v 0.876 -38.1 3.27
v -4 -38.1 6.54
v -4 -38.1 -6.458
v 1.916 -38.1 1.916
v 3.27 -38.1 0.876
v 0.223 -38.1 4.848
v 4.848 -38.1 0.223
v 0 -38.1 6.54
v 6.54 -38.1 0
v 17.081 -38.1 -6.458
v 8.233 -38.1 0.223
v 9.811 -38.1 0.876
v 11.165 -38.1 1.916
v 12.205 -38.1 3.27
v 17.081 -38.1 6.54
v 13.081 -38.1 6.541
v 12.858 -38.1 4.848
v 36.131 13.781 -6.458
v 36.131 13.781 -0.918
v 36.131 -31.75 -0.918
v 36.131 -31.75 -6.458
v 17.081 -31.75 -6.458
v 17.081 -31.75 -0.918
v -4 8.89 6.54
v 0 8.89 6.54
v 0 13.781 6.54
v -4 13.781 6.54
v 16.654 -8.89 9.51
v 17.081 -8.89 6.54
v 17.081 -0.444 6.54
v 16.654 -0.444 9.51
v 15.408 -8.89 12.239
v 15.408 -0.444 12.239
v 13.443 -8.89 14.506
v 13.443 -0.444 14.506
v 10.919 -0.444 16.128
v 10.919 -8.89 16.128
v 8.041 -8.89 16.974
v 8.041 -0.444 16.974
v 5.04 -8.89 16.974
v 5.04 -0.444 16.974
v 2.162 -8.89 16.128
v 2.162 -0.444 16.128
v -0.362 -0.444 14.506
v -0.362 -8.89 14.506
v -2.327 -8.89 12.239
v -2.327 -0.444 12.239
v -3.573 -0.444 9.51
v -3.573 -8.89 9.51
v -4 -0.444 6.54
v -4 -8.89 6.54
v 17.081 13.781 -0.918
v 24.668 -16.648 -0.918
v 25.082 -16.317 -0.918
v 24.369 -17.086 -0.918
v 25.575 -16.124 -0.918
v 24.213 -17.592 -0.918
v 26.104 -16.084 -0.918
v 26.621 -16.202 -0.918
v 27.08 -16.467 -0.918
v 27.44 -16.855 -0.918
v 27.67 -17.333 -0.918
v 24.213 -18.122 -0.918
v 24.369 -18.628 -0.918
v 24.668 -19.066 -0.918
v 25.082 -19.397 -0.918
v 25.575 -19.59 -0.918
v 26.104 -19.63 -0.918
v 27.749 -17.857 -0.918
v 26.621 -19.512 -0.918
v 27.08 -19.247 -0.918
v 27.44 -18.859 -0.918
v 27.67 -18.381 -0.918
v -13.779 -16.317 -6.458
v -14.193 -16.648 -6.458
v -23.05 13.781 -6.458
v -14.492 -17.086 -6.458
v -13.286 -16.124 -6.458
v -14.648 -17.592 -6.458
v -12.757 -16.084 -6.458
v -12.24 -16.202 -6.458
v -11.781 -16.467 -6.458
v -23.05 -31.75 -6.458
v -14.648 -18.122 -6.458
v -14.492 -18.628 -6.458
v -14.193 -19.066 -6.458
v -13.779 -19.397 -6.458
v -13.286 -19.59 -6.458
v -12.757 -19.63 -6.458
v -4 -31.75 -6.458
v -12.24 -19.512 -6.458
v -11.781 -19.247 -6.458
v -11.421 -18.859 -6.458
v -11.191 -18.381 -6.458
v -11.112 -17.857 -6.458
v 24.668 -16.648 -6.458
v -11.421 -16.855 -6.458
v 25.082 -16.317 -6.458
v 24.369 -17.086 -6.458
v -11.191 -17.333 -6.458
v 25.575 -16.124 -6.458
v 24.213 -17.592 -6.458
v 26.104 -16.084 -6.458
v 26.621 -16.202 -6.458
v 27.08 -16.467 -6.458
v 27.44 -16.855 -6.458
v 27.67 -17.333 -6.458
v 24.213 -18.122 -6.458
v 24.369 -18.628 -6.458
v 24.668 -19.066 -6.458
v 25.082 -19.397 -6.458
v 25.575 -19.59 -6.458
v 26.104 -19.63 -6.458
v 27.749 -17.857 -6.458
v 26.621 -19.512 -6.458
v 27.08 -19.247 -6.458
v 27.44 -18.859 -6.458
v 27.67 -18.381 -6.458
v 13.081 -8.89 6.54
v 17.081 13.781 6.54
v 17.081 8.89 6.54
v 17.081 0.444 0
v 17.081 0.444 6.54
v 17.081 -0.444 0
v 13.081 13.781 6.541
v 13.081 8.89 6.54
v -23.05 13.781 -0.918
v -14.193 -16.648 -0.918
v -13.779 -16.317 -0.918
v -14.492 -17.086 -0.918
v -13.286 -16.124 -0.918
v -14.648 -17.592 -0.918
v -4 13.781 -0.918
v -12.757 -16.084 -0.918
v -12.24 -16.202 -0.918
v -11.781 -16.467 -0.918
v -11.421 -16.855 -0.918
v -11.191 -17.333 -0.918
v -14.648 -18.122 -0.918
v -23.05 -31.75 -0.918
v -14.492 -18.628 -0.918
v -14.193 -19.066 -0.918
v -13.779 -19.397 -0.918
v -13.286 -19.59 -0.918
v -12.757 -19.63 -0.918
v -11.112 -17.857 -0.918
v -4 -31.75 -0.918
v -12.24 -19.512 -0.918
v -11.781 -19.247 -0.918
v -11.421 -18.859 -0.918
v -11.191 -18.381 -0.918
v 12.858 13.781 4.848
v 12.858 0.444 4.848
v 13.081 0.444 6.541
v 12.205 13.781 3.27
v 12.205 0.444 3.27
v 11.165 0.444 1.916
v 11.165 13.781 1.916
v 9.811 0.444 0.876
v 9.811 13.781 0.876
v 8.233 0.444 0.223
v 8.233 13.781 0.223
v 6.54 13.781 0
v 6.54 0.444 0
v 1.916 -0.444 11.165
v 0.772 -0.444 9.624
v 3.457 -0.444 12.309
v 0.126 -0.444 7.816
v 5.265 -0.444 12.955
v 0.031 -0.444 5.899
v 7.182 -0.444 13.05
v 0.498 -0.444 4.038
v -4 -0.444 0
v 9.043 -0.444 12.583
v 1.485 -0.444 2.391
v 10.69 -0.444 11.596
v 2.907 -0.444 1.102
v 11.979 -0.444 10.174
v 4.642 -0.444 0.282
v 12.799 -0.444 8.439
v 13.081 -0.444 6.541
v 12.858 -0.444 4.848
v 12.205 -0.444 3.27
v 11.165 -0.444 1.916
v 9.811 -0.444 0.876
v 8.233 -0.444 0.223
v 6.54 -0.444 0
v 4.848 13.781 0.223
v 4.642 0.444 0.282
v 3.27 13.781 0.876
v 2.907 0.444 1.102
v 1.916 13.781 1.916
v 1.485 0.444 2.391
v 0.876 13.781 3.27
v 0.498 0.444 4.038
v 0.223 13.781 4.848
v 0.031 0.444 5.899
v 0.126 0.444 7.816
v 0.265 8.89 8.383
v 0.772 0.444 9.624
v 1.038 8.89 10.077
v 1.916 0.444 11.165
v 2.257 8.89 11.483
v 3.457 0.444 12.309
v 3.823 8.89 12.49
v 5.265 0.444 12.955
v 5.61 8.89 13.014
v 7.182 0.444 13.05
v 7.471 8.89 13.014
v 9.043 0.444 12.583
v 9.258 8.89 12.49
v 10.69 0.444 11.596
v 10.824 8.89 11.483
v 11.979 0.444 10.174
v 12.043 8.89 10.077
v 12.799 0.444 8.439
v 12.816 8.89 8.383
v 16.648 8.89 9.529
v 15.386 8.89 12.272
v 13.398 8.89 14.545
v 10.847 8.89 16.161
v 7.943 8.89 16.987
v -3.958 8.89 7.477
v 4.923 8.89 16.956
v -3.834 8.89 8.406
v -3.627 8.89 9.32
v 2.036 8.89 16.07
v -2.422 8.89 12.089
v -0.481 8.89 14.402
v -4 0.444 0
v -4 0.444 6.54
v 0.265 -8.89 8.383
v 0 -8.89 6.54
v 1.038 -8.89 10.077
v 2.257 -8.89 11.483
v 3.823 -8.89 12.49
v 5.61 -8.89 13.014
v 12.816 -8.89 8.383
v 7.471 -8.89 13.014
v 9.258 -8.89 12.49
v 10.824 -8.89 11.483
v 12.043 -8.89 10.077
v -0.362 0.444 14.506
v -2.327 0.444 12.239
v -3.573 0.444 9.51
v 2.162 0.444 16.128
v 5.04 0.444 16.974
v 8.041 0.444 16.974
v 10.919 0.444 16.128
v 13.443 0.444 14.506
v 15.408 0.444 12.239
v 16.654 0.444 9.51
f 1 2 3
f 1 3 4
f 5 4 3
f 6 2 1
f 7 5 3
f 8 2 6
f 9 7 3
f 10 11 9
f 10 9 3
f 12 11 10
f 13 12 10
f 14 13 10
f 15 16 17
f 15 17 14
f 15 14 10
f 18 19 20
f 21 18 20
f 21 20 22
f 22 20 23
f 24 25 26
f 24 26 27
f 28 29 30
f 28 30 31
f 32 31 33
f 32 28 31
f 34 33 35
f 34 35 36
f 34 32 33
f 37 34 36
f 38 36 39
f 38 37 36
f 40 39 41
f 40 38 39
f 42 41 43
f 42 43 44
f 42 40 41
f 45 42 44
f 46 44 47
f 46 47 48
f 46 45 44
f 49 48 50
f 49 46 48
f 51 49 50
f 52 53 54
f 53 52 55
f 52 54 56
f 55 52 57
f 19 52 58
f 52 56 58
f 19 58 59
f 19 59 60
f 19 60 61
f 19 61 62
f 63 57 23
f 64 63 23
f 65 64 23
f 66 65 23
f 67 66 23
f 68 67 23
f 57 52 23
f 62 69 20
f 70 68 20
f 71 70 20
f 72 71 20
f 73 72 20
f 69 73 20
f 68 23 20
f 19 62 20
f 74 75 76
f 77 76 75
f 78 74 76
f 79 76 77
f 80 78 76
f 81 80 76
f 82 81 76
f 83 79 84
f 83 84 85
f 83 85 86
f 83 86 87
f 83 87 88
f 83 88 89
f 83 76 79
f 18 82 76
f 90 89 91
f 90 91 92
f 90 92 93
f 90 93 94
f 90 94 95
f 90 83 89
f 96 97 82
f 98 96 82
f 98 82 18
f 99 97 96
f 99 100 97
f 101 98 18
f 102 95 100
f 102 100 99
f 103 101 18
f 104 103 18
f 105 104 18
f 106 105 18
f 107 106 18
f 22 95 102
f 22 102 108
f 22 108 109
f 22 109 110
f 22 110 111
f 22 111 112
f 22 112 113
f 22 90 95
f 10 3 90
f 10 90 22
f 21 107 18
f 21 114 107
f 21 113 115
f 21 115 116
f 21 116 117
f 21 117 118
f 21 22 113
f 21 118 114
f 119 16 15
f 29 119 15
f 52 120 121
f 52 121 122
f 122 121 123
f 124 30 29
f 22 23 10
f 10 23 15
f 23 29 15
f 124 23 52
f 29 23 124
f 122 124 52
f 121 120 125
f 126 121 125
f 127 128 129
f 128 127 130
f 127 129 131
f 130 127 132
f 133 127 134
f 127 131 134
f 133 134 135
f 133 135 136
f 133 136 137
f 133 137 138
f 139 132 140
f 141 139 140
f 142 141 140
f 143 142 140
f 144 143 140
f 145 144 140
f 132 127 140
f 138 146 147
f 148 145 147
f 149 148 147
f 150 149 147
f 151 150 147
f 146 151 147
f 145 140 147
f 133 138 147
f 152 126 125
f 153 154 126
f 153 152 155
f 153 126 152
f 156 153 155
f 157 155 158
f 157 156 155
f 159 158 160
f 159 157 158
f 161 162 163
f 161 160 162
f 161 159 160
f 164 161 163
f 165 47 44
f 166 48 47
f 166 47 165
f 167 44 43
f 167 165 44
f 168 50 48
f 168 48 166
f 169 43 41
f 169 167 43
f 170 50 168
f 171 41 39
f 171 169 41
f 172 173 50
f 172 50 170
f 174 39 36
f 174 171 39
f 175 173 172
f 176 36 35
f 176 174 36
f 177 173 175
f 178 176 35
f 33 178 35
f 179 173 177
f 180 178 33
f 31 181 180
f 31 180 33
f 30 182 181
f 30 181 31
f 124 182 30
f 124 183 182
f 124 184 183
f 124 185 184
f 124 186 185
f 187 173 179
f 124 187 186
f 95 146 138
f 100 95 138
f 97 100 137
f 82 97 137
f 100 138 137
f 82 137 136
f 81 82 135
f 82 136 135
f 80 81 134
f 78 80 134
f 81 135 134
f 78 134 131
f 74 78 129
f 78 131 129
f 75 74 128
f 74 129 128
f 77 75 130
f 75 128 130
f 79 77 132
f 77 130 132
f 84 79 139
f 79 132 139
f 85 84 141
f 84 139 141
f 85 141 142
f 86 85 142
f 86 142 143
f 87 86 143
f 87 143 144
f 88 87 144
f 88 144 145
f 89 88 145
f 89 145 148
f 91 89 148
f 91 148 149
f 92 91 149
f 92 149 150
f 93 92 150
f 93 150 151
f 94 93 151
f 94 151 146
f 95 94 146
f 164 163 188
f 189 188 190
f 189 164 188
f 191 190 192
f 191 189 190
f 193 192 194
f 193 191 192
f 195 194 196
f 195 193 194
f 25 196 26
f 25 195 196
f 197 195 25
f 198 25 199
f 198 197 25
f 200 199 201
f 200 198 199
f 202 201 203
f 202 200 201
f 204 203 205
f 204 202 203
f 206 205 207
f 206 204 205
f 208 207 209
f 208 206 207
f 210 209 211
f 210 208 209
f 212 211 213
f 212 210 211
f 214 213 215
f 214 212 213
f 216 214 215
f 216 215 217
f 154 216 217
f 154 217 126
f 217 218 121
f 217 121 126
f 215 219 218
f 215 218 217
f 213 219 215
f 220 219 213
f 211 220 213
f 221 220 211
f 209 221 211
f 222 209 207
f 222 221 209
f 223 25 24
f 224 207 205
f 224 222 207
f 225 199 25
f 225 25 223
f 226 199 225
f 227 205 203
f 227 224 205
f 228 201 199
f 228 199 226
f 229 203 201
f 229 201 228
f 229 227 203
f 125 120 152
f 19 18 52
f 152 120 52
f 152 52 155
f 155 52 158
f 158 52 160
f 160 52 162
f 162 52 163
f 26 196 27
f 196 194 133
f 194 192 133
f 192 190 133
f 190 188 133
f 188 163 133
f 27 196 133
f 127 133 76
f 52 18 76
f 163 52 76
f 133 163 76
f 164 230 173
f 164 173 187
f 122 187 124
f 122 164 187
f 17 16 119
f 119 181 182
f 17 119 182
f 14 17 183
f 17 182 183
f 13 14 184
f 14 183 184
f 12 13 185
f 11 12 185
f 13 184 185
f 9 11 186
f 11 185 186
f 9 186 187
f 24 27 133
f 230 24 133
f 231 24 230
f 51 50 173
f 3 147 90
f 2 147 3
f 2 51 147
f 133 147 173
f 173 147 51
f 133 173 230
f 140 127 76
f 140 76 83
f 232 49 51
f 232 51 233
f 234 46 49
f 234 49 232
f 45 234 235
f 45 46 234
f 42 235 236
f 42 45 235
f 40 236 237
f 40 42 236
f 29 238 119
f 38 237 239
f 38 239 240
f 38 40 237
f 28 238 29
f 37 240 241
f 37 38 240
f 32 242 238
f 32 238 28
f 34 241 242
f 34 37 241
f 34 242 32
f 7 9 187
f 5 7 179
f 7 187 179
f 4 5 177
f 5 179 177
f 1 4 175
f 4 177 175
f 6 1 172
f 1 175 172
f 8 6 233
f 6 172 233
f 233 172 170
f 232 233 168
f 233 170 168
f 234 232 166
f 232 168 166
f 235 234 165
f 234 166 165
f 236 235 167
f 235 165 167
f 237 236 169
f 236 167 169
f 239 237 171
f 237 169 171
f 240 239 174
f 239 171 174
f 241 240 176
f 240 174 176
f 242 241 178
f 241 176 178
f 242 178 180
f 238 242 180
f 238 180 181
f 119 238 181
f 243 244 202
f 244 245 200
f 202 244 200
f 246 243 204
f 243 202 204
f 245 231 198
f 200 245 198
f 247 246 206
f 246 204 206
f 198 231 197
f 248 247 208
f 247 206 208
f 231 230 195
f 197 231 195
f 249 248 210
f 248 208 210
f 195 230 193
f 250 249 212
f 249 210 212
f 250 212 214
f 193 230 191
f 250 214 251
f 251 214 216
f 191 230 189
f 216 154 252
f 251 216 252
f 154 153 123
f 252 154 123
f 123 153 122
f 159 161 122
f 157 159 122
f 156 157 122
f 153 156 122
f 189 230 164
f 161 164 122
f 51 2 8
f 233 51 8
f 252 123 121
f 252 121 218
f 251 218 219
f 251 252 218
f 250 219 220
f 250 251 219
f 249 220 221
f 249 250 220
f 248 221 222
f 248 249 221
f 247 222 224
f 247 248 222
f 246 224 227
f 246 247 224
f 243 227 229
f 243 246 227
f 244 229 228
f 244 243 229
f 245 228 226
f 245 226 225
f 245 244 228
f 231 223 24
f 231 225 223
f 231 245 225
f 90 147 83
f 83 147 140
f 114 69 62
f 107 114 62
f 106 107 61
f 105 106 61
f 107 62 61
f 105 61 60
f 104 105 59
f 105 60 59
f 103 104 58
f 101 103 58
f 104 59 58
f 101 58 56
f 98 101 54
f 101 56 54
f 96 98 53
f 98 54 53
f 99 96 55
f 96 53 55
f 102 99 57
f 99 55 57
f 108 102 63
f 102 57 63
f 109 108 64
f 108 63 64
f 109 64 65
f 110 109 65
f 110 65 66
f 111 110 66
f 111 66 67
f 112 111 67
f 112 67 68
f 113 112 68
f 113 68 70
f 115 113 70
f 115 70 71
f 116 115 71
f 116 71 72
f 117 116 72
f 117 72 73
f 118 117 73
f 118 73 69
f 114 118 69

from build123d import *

# Parameters (mm, degrees)
F1_DEPTH  = 38.1
F2_W      = 46.7332457192
F2_H      = 0.889
F3_DEPTH  = 20.5994
F5_DEPTH  = 29.21
F7_DEPTH  = 29.21
F8_W      = 22.6521064695
F8_H      = 63.5
F8_W_2    = 36.5288935305
F9_DEPTH  = 2.54
F10_DEPTH = 3
F11_W     = 59.181
F11_H     = 17.9686862156
F12_DEPTH = 69.342
F13_W     = 21.081
F13_H     = 6.35
F14_DEPTH = 3
F15_R     = 1.778
F16_DEPTH = 25.4


with BuildPart() as f1:
    # F0 (on Front) → F1 (new body, symmetric)
    with BuildSketch(Plane.XZ):
        with BuildLine():
            ThreePointArc((9.876787061, -3.4580663421), (15.0923499173, 0.3786818234), (17.081, 6.5405))
            ThreePointArc((17.081, 6.5405), (6.5405, 17.081), (-4, 6.5405))
            ThreePointArc((-4, 6.5405), (-2.0113499173, 0.3786818234), (3.204212939, -3.4580663421))
            Line((3.204212939, -3.4580663421), (9.876787061, -3.4580663421))
        make_face()
        with BuildLine():
            ThreePointArc((6.5405, 0), (1.9156680976, 11.1653319024), (13.081, 6.5405))
            ThreePointArc((13.081, 6.5405), (11.1653319024, 1.9156680976), (6.5405, 0))
        make_face(mode=Mode.SUBTRACT)
        with BuildLine():
            Line((17.081, 0), (17.081, 6.5405))
            ThreePointArc((17.081, 6.5405), (15.0923499173, 0.3786818234), (9.876787061, -3.4580663421))
            Line((9.876787061, -3.4580663421), (17.081, -3.4580663421))
            Line((17.081, -3.4580663421), (17.081, 0))
        make_face()
        with BuildLine():
            ThreePointArc((3.204212939, -3.4580663421), (-2.0113499173, 0.3786818234), (-4, 6.5405))
            Line((-4, 6.5405), (-4, -3.4580663421))
            Line((-4, -3.4580663421), (3.204212939, -3.4580663421))
        make_face()
        with BuildLine():
            ThreePointArc((3.204212939, -3.4580663421), (6.5405, -4), (9.876787061, -3.4580663421))
            Line((9.876787061, -3.4580663421), (3.204212939, -3.4580663421))
        make_face()
    extrude(amount=F1_DEPTH, both=True)

    # F2 (on Top) → F3 (cut)
    with BuildSketch(Plane.XY):
        Rectangle(F2_W, F2_H)
    extrude(amount=F3_DEPTH, mode=Mode.SUBTRACT)

    # F4 (on face) → F5 (cut)
    with BuildSketch(Plane(origin=(0, 38.1, 0), x_dir=(-1, 0, 0), z_dir=(0, 1, 0))):
        with BuildLine():
            ThreePointArc((-17.081, 6.5405), (-7.9427578532, 16.987308755), (3.6269006049, 9.3200872335))
            Line((3.6269006049, 9.3200872335), (4, 28.6066166948))
            Line((4, 28.6066166948), (-17.081, 29.0144302604))
            Line((-17.081, 29.0144302604), (-17.5960424147, 27.9336988817))
            Line((-17.5960424147, 27.9336988817), (-17.081, 6.5405))
        make_face()
        with BuildLine():
            ThreePointArc((-13.081, 6.5405), (-6.5405, 13.081), (0, 6.5405))
            Line((0, 6.5405), (4, 6.5405))
            ThreePointArc((4, 6.5405), (3.906308755, 7.9427578532), (3.6269006049, 9.3200872335))
            ThreePointArc((3.6269006049, 9.3200872335), (-7.9427578532, 16.987308755), (-17.081, 6.5405))
            Line((-17.081, 6.5405), (-13.081, 6.5405))
        make_face()
        with BuildLine():
            Line((-13.081, 6.5405), (0, 6.5405))
            ThreePointArc((0, 6.5405), (-6.5405, 13.081), (-13.081, 6.5405))
        make_face()
    extrude(amount=-F5_DEPTH, mode=Mode.SUBTRACT)

    # F6 (on face) → F7 (cut)
    with BuildSketch(Plane.XZ.offset(38.1)):
        with BuildLine():
            ThreePointArc((0, 6.5405), (6.5405, 13.081), (13.081, 6.5405))
            Line((13.081, 6.5405), (17.081, 6.5405))
            ThreePointArc((17.081, 6.5405), (6.5405, 17.081), (-4, 6.5405))
            Line((-4, 6.5405), (0, 6.5405))
        make_face()
    extrude(amount=-F7_DEPTH, mode=Mode.SUBTRACT)

    # F8 (on face) → F9 (join)
    with BuildSketch(Plane(origin=(0, 0, -3.4580663421), x_dir=(1, 0, 0), z_dir=(0, 0, -1))):
        with Locations((24.8049467652, 0)):
            Rectangle(F8_W, F8_H)
        with Locations((-4.7855532348, 0)):
            Rectangle(F8_W_2, F8_H)
    extrude(amount=-F9_DEPTH)

    # F8 (on face) → F10 (join)
    with BuildSketch(Plane(origin=(0, 0, -3.4580663421), x_dir=(1, 0, 0), z_dir=(0, 0, -1))):
        with Locations((24.8049467652, 0)):
            Rectangle(F8_W, F8_H)
        with Locations((-4.7855532348, 0)):
            Rectangle(F8_W_2, F8_H)
    extrude(amount=F10_DEPTH)

    # F11 (on face) → F12 (cut)
    with BuildSketch(Plane(origin=(0, 0, -6.4580663421), x_dir=(1, 0, 0), z_dir=(0, 0, -1))):
        with Locations((6.5405, -22.7656568922)):
            Rectangle(F11_W, F11_H)
        Polygon((-23.05, -13.7813137844), (-30.0445724279, -13.7813137844), (-30.0445724279, -67.8615421057), (58.1297166646, -67.8615421057), (58.1297166646, -13.7813137844), (36.131, -13.7813137844), (36.131, -31.75), (-23.05, -31.75), align=None)
    extrude(amount=-F12_DEPTH, mode=Mode.SUBTRACT)

    # F13 (on face) → F14 (join, through all)
    with BuildSketch(Plane(origin=(0, 0, -3.4580663421), x_dir=(1, 0, 0), z_dir=(0, 0, -1))):
        with Locations((6.5405, 34.925)):
            Rectangle(F13_W, F13_H)
    extrude(amount=F14_DEPTH)

    # F15 (on face) → F16 (cut)
    with BuildSketch(Plane.XY.offset(-0.9180663421)):
        with Locations((-12.89, -17.8570281714)):
            Circle(F15_R)
        with Locations((25.971, -17.8570281714)):
            Circle(F15_R)
    extrude(amount=-F16_DEPTH, mode=Mode.SUBTRACT)


solid = f1.part
